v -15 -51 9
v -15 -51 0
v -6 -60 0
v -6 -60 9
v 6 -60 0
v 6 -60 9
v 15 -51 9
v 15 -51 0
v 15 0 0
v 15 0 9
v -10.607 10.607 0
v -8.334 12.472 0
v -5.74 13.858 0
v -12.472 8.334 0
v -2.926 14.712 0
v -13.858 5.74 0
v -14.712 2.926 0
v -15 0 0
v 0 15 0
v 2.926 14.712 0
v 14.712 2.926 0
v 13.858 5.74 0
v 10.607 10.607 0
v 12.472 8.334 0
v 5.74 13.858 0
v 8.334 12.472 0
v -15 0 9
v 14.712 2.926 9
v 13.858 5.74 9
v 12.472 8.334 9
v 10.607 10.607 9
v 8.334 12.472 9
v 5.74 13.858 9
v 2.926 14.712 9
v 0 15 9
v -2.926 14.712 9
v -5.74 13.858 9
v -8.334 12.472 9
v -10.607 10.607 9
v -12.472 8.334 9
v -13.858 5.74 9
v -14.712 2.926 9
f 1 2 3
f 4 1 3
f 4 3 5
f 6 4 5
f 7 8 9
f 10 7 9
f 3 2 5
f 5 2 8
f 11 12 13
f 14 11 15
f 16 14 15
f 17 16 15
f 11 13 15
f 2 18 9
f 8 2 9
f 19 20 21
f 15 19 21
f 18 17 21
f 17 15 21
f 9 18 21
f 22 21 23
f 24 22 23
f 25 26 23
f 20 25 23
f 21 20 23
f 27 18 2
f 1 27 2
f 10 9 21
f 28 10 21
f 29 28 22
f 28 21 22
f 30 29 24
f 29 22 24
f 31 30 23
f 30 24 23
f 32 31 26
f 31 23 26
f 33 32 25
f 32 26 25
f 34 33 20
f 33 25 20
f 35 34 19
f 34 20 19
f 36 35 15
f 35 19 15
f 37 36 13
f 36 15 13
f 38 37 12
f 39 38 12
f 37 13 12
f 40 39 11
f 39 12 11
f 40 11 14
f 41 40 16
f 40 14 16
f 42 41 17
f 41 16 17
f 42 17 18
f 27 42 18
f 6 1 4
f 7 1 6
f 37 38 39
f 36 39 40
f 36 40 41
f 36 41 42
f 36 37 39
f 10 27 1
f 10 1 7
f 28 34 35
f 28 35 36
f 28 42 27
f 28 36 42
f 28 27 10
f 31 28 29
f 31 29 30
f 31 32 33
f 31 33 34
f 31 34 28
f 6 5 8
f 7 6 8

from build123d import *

# Parameters (mm, degrees)
F1_DEPTH = 9


with BuildPart() as f1:
    # F0 (on Top) → F1 (new body)
    with BuildSketch(Plane.XY):
        with BuildLine():
            Line((15, -51), (15, 0))
            ThreePointArc((15, 0), (0, 15), (-15, 0))
            Line((-15, 0), (-15, -51))
            Line((-15, -51), (-6, -60))
            Line((-6, -60), (6, -60))
            Line((6, -60), (15, -51))
        make_face()
    extrude(amount=F1_DEPTH)


solid = f1.part
